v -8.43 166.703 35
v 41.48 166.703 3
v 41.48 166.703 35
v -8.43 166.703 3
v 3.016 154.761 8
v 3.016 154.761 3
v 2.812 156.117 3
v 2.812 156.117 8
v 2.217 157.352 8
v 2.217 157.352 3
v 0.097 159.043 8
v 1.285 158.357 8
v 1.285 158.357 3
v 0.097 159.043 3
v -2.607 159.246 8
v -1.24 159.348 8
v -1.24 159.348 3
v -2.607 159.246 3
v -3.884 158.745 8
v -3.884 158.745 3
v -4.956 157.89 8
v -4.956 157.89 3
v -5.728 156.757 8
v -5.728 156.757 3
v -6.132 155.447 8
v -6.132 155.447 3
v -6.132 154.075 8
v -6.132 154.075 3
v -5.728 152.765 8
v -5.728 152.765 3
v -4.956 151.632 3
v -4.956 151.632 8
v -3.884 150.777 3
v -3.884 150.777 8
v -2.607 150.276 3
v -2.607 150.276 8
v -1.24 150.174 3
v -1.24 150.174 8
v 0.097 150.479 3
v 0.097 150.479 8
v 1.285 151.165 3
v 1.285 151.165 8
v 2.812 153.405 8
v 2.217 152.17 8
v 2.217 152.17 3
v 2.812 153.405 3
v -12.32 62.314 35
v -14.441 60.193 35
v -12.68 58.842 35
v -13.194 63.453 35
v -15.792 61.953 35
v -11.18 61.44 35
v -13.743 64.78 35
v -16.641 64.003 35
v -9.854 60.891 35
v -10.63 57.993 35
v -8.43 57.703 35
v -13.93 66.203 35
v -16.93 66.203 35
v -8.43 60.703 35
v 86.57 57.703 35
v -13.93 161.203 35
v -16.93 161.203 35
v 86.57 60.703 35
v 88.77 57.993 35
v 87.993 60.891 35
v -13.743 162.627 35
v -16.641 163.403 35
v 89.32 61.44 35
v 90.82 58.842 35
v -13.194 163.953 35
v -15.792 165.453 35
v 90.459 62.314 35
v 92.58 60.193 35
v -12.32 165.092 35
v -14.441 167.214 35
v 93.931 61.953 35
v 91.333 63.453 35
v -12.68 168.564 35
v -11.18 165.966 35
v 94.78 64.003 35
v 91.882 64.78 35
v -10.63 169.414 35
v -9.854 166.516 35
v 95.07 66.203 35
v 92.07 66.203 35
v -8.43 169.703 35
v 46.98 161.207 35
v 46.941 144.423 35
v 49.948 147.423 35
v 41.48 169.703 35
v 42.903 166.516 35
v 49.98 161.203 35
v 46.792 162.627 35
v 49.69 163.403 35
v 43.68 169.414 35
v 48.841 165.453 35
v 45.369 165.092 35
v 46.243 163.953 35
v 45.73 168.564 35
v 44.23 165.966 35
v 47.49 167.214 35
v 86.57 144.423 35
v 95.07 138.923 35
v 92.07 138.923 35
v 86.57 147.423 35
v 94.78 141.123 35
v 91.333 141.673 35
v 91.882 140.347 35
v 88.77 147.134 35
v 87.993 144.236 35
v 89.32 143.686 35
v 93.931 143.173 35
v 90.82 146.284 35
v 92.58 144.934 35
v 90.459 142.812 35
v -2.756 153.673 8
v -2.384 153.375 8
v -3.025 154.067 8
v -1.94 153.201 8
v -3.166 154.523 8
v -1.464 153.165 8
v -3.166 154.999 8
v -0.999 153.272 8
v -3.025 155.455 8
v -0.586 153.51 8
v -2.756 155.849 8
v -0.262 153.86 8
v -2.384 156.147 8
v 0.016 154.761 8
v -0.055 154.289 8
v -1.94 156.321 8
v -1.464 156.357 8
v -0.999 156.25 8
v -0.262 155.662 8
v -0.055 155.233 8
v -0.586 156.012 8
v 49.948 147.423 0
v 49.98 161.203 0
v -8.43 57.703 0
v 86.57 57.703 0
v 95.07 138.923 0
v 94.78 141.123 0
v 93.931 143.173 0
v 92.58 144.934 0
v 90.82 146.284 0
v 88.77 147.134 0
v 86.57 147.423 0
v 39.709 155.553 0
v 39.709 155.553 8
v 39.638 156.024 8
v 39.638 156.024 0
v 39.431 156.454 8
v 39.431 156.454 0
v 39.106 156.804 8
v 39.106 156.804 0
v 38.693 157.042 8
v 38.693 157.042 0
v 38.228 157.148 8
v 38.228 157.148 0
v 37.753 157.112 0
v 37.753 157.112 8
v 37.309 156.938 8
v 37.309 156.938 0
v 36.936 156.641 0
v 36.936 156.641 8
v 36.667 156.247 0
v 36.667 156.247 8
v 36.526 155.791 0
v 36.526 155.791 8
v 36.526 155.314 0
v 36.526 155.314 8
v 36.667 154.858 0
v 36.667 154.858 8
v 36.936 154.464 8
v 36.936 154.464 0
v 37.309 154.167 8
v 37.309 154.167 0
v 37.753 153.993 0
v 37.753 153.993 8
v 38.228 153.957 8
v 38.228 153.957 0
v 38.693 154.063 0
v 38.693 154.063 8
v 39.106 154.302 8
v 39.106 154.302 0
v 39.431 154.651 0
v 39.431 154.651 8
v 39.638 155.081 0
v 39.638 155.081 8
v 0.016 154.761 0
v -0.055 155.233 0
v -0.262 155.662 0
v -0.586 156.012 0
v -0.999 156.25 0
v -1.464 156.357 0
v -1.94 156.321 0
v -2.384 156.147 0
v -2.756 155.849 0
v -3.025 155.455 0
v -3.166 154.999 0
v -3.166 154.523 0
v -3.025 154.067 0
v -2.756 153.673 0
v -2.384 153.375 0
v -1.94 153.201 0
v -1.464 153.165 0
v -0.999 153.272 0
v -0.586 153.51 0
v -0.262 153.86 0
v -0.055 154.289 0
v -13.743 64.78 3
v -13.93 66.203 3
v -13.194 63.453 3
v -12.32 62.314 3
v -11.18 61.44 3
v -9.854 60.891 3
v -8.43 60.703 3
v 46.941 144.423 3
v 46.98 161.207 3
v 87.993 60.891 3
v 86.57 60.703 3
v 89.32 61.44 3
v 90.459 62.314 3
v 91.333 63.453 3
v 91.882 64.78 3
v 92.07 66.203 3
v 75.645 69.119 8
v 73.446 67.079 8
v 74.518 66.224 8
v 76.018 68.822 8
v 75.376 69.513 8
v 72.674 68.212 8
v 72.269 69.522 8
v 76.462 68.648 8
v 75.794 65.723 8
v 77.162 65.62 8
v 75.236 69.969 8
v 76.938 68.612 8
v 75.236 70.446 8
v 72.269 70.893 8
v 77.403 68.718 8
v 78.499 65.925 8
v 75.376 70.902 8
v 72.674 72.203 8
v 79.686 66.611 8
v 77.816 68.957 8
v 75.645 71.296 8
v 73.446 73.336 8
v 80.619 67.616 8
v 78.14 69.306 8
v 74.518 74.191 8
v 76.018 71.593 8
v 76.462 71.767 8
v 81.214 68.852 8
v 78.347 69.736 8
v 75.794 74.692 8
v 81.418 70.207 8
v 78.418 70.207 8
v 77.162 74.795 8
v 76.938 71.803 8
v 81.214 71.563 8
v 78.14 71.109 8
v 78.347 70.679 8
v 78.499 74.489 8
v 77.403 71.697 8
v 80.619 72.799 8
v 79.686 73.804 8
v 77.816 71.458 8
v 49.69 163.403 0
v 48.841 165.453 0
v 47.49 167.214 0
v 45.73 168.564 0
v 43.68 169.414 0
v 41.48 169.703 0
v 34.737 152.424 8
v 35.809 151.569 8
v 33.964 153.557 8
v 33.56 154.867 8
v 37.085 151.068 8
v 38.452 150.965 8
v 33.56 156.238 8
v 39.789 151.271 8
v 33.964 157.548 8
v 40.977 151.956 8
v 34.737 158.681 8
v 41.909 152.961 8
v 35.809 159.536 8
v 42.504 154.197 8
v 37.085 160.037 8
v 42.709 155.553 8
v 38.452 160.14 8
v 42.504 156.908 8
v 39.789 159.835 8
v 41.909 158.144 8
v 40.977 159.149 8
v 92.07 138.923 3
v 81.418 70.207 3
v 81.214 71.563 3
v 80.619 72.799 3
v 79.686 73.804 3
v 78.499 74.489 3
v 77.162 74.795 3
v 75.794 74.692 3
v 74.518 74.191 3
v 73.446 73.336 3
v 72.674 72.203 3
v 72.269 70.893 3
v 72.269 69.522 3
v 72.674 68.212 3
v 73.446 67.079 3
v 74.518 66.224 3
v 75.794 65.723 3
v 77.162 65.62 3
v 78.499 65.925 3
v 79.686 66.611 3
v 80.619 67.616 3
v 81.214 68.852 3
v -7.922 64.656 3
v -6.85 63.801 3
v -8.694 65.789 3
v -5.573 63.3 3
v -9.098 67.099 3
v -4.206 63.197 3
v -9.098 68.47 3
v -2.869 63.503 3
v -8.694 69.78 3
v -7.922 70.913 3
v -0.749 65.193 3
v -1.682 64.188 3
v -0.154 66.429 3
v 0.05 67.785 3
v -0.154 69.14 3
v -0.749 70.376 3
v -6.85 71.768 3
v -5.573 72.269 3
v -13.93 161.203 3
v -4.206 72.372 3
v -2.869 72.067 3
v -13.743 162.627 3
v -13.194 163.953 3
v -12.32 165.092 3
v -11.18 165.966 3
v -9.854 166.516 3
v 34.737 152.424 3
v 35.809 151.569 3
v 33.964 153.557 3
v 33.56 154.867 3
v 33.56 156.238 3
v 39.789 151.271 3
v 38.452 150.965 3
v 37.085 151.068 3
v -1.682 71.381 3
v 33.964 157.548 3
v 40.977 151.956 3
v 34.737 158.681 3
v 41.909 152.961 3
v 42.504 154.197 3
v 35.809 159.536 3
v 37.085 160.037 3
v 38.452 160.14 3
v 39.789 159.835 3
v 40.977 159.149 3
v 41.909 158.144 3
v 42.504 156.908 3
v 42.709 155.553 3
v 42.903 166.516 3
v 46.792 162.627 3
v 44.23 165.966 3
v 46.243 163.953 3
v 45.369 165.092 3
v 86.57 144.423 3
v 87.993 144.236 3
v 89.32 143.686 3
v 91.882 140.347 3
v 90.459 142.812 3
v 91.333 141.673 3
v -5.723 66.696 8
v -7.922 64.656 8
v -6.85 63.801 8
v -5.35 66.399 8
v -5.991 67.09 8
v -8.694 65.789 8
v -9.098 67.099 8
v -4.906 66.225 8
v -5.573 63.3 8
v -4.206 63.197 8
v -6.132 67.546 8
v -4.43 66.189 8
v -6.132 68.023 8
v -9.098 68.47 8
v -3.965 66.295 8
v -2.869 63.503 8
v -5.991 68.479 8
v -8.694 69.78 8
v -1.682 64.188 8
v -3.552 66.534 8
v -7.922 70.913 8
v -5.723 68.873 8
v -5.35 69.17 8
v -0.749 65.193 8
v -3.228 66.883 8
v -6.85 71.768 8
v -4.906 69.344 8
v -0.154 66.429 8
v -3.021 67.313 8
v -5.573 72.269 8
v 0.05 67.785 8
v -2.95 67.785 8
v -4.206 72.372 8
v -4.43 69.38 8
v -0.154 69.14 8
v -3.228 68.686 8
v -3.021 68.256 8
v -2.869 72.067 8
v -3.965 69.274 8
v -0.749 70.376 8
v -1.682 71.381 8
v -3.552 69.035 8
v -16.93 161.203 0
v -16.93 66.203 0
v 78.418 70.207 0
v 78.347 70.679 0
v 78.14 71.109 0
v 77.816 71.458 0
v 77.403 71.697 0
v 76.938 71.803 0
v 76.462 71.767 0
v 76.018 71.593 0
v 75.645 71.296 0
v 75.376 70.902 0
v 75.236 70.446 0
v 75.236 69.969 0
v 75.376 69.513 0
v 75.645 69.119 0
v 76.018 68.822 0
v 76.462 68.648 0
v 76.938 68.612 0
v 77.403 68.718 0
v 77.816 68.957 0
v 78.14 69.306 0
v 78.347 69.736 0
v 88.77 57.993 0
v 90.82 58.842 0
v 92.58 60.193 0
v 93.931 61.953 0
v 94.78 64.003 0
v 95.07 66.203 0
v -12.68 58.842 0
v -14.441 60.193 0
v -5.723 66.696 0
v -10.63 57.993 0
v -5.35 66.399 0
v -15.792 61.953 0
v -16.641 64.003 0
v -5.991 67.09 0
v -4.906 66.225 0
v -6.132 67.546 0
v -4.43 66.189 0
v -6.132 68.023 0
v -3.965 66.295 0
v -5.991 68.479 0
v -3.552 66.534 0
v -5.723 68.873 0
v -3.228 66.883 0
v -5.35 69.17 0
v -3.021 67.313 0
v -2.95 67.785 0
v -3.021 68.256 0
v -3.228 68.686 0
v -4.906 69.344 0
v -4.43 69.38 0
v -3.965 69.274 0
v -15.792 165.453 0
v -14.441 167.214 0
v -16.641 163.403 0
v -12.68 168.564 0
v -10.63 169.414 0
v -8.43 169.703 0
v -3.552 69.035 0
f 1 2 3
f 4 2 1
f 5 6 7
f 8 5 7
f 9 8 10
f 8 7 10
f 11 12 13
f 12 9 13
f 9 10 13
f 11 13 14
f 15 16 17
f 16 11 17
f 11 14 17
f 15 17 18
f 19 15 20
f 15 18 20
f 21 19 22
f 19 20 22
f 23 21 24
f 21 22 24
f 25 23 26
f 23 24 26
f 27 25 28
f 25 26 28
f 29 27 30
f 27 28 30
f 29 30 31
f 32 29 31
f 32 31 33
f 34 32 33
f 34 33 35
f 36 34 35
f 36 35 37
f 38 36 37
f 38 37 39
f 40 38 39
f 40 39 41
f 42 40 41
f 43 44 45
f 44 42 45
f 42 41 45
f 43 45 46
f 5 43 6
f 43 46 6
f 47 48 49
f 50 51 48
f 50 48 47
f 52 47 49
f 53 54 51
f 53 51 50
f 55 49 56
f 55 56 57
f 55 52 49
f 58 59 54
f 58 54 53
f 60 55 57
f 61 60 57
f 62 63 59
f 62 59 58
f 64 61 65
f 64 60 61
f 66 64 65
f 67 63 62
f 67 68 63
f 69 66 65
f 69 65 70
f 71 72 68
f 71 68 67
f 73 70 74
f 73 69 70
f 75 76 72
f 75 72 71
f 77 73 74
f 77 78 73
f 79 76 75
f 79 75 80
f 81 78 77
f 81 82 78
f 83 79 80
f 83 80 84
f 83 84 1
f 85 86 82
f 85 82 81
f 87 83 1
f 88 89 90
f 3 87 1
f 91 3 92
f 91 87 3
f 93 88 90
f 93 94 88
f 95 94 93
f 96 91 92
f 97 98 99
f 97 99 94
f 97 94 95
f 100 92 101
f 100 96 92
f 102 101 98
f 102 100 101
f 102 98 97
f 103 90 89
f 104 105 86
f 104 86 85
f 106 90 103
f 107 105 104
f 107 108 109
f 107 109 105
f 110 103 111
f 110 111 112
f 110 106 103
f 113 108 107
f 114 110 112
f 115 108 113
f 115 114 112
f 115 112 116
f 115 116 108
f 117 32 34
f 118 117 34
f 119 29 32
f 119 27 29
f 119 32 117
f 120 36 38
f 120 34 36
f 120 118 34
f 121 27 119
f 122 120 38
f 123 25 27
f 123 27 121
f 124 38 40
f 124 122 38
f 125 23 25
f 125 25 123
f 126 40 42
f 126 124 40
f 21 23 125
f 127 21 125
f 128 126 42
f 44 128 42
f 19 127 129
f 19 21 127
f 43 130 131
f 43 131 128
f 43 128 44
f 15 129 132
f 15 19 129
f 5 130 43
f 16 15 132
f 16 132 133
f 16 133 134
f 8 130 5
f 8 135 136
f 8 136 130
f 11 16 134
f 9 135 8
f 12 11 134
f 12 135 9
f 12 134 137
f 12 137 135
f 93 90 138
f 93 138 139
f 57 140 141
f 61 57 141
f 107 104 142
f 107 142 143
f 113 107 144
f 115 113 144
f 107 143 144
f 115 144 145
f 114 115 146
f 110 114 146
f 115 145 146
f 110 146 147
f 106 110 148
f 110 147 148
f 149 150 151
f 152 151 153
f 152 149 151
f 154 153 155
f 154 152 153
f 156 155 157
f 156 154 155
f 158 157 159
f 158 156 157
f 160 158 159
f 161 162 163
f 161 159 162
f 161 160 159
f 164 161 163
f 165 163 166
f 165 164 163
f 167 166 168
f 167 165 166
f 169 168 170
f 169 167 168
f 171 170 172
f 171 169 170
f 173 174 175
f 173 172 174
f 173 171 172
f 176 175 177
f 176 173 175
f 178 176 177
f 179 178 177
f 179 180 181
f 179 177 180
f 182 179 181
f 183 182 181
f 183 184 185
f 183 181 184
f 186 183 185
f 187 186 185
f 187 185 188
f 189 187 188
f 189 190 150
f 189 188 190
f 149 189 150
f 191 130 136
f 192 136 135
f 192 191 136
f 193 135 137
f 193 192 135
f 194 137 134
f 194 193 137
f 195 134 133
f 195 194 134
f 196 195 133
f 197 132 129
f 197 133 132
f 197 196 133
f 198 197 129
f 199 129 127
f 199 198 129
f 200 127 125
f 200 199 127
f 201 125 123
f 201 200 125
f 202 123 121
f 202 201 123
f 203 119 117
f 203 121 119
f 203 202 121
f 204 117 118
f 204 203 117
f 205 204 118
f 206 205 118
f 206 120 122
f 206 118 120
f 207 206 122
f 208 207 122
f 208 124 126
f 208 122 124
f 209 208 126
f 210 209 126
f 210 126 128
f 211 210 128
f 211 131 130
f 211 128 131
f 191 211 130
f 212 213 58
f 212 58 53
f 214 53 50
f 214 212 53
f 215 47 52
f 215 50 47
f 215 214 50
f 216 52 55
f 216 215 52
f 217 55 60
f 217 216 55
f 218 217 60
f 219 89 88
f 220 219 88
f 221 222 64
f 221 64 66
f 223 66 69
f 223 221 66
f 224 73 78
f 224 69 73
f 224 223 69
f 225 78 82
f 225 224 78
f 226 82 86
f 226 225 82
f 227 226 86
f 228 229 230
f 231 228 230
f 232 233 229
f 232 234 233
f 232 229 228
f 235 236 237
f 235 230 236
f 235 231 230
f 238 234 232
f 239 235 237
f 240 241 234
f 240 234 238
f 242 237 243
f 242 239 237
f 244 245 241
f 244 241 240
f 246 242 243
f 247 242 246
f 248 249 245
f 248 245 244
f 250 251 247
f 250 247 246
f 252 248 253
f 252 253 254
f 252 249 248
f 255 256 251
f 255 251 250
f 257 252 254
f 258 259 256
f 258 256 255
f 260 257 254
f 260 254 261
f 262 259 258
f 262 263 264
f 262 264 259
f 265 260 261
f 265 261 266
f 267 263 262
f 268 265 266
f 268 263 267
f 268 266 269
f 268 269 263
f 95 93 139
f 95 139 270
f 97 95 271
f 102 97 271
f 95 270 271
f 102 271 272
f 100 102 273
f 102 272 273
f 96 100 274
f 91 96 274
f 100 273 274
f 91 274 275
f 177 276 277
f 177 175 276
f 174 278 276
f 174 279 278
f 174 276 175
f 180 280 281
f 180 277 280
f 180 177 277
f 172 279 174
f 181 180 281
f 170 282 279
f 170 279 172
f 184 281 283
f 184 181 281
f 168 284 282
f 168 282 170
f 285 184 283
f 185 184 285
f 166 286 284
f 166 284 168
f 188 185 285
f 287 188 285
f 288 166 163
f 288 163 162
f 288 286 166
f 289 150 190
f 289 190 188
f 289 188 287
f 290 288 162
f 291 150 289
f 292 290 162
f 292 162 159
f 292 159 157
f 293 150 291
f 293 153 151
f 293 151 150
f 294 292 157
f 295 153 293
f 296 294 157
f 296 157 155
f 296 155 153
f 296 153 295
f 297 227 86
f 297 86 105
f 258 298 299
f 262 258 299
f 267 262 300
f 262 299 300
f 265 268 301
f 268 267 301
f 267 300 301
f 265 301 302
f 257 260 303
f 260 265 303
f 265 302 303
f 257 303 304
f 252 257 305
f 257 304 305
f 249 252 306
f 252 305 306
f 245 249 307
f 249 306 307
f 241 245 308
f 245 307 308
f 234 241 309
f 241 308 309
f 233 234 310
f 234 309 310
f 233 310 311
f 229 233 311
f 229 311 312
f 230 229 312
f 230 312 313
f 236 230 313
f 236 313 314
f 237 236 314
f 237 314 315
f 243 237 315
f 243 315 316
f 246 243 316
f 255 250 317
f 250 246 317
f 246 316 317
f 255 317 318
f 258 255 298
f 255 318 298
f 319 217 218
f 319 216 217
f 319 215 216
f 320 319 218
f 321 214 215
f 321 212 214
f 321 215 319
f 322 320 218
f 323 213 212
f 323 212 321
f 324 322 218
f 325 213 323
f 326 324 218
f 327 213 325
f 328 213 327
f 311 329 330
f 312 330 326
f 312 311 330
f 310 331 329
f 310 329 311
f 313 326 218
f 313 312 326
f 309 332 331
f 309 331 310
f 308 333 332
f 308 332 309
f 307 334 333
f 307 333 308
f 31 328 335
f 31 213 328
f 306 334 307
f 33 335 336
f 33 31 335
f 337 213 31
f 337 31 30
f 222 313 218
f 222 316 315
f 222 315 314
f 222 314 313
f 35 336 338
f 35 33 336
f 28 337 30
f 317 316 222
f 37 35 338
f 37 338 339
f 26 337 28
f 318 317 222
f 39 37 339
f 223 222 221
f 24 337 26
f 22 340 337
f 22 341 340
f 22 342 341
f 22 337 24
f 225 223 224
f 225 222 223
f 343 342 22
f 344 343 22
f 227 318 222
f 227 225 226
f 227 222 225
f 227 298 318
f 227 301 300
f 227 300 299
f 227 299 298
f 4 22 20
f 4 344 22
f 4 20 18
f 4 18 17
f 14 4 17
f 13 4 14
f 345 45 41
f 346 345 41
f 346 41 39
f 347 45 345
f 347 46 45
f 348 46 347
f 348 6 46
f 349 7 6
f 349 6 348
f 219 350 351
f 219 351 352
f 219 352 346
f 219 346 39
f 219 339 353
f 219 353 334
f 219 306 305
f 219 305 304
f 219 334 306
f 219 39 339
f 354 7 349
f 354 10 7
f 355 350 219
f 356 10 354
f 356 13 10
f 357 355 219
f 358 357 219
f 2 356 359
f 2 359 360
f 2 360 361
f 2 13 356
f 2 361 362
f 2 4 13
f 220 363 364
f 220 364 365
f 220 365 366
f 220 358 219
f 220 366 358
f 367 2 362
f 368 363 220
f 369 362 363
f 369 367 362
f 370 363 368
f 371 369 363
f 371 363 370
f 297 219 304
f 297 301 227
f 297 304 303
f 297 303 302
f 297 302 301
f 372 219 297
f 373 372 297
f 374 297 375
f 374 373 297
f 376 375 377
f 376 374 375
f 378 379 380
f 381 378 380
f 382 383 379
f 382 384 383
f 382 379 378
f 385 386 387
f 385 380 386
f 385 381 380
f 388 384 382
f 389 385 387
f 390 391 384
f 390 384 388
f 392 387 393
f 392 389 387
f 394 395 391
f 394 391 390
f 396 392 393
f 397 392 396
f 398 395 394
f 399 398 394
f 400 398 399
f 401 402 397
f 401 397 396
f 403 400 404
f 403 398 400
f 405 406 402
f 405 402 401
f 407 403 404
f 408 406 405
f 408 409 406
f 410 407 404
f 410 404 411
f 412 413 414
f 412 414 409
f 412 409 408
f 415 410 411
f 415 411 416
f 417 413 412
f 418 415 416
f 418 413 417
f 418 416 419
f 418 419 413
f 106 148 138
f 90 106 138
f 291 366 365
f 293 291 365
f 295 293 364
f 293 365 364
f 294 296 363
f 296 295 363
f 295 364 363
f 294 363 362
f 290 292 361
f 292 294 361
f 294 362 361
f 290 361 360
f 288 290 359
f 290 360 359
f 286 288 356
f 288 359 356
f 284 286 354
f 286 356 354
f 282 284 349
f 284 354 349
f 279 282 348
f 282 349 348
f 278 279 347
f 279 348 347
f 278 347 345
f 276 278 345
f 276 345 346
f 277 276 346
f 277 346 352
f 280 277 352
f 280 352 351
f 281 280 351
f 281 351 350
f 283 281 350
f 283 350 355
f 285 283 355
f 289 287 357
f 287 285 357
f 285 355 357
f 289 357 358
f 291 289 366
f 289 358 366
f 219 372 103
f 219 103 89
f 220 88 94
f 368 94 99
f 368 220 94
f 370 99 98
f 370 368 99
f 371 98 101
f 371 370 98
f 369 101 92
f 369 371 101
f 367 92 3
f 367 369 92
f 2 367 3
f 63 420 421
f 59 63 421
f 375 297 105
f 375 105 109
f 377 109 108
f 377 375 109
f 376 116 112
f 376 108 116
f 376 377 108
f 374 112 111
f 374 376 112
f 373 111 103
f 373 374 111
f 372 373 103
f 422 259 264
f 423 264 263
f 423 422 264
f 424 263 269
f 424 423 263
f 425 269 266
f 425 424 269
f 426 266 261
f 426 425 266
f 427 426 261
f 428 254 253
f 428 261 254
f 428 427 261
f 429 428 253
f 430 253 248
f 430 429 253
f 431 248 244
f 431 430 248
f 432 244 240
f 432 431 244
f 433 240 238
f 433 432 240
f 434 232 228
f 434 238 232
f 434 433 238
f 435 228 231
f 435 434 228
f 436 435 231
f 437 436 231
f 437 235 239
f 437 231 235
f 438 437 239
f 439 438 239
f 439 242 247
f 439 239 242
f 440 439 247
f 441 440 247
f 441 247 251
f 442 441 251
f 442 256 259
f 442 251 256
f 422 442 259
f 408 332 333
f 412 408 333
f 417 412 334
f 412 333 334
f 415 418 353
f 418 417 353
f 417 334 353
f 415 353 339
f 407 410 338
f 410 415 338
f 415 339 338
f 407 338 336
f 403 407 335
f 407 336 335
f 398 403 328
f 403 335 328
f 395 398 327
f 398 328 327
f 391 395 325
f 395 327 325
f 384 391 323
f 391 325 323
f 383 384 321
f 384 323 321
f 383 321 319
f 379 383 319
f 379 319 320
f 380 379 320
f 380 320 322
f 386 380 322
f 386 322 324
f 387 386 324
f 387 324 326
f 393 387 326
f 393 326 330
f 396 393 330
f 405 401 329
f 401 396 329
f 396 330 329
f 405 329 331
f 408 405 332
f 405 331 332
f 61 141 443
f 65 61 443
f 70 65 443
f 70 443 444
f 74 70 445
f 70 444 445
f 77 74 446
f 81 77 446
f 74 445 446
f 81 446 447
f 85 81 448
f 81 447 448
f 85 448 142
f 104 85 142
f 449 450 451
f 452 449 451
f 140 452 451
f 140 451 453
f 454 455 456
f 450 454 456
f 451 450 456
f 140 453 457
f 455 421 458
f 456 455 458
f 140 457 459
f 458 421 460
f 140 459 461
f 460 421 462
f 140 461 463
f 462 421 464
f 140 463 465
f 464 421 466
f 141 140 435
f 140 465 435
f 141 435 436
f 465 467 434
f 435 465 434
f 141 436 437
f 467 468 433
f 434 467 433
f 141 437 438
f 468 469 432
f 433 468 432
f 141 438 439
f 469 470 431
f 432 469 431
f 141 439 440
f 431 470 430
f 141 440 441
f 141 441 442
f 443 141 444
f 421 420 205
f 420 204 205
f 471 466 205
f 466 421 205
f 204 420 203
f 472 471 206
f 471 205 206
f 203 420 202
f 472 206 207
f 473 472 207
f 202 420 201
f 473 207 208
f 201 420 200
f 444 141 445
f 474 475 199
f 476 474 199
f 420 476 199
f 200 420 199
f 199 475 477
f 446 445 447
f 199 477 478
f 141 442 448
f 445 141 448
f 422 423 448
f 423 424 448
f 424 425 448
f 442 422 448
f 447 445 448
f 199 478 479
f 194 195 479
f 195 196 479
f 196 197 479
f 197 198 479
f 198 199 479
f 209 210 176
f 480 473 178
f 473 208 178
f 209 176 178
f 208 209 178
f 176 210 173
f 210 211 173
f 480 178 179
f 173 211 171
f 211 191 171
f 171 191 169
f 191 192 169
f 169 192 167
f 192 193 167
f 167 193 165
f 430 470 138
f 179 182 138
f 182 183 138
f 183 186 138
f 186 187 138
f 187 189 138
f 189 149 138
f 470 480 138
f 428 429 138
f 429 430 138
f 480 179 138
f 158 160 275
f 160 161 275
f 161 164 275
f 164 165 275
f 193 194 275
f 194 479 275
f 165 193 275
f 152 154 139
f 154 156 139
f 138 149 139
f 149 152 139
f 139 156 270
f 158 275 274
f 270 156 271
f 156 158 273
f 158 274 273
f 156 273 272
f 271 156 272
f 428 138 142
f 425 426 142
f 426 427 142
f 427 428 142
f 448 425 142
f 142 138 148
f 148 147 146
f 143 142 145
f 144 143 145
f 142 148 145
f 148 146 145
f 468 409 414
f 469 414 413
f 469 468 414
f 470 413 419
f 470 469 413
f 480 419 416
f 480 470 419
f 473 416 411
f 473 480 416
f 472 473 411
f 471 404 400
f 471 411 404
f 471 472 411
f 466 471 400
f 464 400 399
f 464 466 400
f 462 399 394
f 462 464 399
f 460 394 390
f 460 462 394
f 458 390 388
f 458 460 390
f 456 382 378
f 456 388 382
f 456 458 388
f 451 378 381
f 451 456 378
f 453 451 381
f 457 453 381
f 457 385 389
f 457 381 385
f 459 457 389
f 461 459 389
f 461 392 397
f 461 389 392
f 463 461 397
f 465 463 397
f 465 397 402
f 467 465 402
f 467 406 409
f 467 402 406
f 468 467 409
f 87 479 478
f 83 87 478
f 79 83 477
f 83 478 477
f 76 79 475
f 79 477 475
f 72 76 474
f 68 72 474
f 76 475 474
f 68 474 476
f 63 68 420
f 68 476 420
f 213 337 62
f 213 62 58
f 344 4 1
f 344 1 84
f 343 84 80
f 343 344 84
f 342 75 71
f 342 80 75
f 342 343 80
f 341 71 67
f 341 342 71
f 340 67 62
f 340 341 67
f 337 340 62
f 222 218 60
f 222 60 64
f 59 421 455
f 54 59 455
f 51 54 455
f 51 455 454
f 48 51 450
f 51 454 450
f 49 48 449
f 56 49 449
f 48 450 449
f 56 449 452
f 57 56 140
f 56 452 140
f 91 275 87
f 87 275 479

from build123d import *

# Parameters (mm, degrees)
SKETCH1_R           = 1.6
BOSS_EXTRUDE1_DEPTH = 35
SHELL3_T            = -3
CUT_EXTRUDE2_DEPTH  = 27


with BuildPart() as part:
    # Sketch1 → Boss-Extrude1 (new body)
    with BuildSketch(Plane.XY):
        with BuildLine():
            Line((41.47958643, 169.703196001), (-8.43041357, 169.703196001))
            ThreePointArc((-8.43041357, 169.703196001), (-14.44082121, 167.213603641), (-16.93041357, 161.203196001))
            Line((-16.93041357, 161.203196001), (-16.93041357, 66.203196001))
            ThreePointArc((-16.93041357, 66.203196001), (-14.44082121, 60.192788361), (-8.43041357, 57.703196001))
            Line((-8.43041357, 57.703196001), (86.56958643, 57.703196001))
            ThreePointArc((86.56958643, 57.703196001), (92.57999407, 60.192788361), (95.06958643, 66.203196001))
            Line((95.06958643, 66.203196001), (95.06958643, 138.923196001))
            ThreePointArc((95.06958643, 138.923196001), (92.57999407, 144.933603641), (86.56958643, 147.423196001))
            Line((86.56958643, 147.423196001), (84.57958643, 147.423196001))
            Line((84.57958643, 147.423196001), (78.22958643, 147.423196001))
            Line((78.22958643, 147.423196001), (56.63958643, 147.423196001))
            Line((56.63958643, 147.423196001), (50.28958643, 147.423196001))
            Line((50.28958643, 147.423196001), (49.947630422, 147.423196001))
            Line((49.947630422, 147.423196001), (49.97958643, 161.203196001))
            ThreePointArc((49.97958643, 161.203196001), (47.48999407, 167.213603641), (41.47958643, 169.703196001))
        make_face()
        with Locations((-1.583516975, 154.760976138)):
            Circle(SKETCH1_R, mode=Mode.SUBTRACT)
        with Locations((38.108590224, 155.552573365)):
            Circle(SKETCH1_R, mode=Mode.SUBTRACT)
        with Locations((-4.549842033, 67.784537285)):
            Circle(SKETCH1_R, mode=Mode.SUBTRACT)
        with Locations((76.81802316, 70.207451643)):
            Circle(SKETCH1_R, mode=Mode.SUBTRACT)
    extrude(amount=BOSS_EXTRUDE1_DEPTH)

    # Shell3
    shell3_openings = [part.faces().sort_by_distance(p)[0] for p in [
        (36.150005596, 109.720855489, 35),
    ]]
    offset(amount=SHELL3_T, openings=shell3_openings, kind=Kind.INTERSECTION)

    # Sketch4 → Cut-Extrude2 (cut)
    with BuildSketch(Plane.XY.offset(35)):
        with BuildLine():
            Line((41.47958643, 164.703196001), (-8.43041357, 164.703196001))
            ThreePointArc((-8.43041357, 164.703196001), (-10.905287304, 163.678069735), (-11.93041357, 161.203196001))
            Line((-11.93041357, 161.203196001), (-11.93041357, 66.203196001))
            ThreePointArc((-11.93041357, 66.203196001), (-10.905287304, 63.728322267), (-8.43041357, 62.703196001))
            Line((-8.43041357, 62.703196001), (86.56958643, 62.703196001))
            ThreePointArc((86.56958643, 62.703196001), (89.044460164, 63.728322267), (90.06958643, 66.203196001))
            Line((90.06958643, 66.203196001), (90.06958643, 138.923196001))
            ThreePointArc((90.06958643, 138.923196001), (89.044460164, 141.398069735), (86.56958643, 142.423196001))
            Line((86.56958643, 142.423196001), (44.936021909, 142.423196001))
            Line((44.936021909, 142.423196001), (44.979583495, 161.207728174))
            ThreePointArc((44.979583495, 161.207728174), (43.95285728, 163.679671582), (41.47958643, 164.703196001))
        make_face()
    extrude(amount=-CUT_EXTRUDE2_DEPTH, mode=Mode.SUBTRACT)


solid = part.part
